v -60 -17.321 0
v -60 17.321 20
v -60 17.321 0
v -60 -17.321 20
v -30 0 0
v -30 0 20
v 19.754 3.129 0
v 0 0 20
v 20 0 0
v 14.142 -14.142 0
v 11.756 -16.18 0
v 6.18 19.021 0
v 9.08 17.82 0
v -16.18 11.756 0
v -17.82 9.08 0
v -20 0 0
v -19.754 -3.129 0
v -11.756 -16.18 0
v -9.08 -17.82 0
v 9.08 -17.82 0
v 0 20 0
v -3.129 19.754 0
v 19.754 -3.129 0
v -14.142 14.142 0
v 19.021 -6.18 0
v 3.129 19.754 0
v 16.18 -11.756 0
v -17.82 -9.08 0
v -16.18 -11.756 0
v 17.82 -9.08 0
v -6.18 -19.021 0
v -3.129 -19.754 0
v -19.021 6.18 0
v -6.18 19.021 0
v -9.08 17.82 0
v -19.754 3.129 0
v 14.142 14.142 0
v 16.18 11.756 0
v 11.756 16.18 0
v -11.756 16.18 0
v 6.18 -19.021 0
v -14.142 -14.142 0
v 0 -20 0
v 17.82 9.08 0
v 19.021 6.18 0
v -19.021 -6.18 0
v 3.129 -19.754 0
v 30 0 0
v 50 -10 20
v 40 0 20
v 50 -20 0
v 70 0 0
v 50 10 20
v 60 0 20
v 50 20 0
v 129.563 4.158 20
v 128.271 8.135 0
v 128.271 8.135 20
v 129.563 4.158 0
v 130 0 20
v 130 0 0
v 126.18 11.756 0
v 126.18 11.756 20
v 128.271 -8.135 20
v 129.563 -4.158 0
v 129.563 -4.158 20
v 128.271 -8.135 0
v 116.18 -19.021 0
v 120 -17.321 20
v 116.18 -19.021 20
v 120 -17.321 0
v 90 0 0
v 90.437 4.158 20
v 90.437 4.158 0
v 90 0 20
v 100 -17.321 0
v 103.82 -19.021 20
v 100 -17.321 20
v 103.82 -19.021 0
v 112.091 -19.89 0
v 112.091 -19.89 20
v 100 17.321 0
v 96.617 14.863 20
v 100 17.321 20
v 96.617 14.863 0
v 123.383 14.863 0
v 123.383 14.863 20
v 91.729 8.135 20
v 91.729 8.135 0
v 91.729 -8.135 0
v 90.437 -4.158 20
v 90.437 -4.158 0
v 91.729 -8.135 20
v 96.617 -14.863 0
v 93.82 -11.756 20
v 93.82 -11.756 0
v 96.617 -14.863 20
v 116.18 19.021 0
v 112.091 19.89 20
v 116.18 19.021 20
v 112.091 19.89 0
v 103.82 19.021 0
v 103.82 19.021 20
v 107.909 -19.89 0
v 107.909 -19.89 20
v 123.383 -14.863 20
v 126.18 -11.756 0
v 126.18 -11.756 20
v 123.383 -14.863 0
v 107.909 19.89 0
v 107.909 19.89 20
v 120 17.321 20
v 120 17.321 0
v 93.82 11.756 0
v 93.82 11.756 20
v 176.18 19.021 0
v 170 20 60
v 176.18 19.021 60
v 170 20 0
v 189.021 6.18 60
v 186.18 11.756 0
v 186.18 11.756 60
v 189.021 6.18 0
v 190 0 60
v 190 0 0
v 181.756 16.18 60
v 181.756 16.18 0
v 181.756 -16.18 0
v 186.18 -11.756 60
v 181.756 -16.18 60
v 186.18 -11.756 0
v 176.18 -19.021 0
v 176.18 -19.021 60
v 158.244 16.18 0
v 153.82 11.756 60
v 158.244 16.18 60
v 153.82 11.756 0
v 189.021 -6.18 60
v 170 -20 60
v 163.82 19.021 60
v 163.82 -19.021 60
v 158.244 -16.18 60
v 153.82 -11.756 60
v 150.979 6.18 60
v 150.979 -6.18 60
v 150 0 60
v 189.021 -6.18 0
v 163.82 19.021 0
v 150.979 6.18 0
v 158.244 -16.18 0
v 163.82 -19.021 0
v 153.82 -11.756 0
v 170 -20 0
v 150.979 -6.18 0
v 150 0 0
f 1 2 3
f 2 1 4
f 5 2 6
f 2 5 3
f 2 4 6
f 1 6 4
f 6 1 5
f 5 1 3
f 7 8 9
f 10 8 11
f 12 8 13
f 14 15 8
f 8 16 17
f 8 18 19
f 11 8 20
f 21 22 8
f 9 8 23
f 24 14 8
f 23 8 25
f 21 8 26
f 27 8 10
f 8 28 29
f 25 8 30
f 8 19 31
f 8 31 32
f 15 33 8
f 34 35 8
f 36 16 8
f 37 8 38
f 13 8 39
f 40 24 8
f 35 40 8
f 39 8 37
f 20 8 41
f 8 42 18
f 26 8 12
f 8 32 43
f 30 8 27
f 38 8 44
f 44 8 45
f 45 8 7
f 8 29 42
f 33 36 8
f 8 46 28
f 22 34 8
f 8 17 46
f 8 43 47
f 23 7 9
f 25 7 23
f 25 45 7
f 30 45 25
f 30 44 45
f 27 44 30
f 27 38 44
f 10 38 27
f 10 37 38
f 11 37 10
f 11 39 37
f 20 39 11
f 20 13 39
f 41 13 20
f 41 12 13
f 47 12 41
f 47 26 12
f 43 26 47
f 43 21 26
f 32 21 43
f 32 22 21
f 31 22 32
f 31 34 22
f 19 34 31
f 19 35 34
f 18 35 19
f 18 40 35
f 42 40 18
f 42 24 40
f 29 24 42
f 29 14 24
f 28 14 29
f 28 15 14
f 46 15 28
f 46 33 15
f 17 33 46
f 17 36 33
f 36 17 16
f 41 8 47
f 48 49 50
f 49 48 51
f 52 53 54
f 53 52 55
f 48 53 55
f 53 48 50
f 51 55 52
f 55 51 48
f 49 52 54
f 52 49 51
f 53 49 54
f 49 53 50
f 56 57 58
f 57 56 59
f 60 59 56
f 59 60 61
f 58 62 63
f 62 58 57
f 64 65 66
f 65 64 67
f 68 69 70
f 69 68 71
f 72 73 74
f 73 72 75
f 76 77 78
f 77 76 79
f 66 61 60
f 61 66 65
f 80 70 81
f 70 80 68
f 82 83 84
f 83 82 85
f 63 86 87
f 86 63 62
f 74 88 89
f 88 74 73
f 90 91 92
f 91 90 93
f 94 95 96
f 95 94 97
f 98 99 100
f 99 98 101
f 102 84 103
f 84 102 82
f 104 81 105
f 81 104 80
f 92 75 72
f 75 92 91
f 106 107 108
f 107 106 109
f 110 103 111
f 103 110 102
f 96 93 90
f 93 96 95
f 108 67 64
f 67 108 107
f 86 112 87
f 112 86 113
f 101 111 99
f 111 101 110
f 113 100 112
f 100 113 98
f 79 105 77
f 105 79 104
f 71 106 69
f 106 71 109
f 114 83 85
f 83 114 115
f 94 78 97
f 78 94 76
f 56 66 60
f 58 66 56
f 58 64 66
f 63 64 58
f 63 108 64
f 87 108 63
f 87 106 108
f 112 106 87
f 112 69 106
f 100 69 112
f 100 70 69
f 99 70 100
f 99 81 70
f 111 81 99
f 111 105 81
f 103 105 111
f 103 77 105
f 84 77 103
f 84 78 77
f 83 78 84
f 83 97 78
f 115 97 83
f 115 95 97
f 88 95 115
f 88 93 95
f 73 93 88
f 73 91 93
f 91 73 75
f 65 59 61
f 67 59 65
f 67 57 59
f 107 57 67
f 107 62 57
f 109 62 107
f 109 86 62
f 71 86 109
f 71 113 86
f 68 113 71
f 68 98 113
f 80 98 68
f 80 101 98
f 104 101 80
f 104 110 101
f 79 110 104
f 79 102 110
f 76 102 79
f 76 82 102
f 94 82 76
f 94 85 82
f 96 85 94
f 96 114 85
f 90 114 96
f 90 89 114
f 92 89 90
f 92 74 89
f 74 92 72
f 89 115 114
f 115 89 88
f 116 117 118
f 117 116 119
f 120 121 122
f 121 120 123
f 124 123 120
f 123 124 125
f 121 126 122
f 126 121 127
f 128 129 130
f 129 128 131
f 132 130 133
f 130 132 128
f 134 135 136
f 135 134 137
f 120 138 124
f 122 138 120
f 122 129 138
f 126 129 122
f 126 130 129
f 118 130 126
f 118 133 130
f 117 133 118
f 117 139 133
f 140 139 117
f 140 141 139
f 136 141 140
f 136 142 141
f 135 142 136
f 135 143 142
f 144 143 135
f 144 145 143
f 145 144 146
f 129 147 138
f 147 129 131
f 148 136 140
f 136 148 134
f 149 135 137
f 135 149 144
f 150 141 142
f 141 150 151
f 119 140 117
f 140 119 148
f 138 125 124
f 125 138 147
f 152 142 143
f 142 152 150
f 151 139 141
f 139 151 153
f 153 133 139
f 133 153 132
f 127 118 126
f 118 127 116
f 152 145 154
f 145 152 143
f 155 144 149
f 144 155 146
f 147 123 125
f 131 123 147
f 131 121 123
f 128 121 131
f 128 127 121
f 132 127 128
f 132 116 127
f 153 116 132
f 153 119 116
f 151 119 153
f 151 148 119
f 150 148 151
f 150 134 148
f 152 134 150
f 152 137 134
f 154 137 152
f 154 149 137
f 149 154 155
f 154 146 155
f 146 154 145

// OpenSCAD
// originally from https://en.wikibooks.org/wiki/OpenSCAD_User_Manual/Primitive_Solids#cylinder

translate([-50, 0, 0])
cylinder(20,20,20, $fn=3);

color("pink")
translate([0, 0, 0])
cylinder(20,20,00, $fn=40);

color("blue")
translate([50, 0, 0])
cylinder(h=20, r1=20, r2=10, $fn=4);

color("green")
translate([110, 0, 0])
cylinder(h=20, r1=20, r2=20, $fn=30);

color("red")
translate([170, 0, 0])        
cylinder(r=20, h = 60, $fn=20);
